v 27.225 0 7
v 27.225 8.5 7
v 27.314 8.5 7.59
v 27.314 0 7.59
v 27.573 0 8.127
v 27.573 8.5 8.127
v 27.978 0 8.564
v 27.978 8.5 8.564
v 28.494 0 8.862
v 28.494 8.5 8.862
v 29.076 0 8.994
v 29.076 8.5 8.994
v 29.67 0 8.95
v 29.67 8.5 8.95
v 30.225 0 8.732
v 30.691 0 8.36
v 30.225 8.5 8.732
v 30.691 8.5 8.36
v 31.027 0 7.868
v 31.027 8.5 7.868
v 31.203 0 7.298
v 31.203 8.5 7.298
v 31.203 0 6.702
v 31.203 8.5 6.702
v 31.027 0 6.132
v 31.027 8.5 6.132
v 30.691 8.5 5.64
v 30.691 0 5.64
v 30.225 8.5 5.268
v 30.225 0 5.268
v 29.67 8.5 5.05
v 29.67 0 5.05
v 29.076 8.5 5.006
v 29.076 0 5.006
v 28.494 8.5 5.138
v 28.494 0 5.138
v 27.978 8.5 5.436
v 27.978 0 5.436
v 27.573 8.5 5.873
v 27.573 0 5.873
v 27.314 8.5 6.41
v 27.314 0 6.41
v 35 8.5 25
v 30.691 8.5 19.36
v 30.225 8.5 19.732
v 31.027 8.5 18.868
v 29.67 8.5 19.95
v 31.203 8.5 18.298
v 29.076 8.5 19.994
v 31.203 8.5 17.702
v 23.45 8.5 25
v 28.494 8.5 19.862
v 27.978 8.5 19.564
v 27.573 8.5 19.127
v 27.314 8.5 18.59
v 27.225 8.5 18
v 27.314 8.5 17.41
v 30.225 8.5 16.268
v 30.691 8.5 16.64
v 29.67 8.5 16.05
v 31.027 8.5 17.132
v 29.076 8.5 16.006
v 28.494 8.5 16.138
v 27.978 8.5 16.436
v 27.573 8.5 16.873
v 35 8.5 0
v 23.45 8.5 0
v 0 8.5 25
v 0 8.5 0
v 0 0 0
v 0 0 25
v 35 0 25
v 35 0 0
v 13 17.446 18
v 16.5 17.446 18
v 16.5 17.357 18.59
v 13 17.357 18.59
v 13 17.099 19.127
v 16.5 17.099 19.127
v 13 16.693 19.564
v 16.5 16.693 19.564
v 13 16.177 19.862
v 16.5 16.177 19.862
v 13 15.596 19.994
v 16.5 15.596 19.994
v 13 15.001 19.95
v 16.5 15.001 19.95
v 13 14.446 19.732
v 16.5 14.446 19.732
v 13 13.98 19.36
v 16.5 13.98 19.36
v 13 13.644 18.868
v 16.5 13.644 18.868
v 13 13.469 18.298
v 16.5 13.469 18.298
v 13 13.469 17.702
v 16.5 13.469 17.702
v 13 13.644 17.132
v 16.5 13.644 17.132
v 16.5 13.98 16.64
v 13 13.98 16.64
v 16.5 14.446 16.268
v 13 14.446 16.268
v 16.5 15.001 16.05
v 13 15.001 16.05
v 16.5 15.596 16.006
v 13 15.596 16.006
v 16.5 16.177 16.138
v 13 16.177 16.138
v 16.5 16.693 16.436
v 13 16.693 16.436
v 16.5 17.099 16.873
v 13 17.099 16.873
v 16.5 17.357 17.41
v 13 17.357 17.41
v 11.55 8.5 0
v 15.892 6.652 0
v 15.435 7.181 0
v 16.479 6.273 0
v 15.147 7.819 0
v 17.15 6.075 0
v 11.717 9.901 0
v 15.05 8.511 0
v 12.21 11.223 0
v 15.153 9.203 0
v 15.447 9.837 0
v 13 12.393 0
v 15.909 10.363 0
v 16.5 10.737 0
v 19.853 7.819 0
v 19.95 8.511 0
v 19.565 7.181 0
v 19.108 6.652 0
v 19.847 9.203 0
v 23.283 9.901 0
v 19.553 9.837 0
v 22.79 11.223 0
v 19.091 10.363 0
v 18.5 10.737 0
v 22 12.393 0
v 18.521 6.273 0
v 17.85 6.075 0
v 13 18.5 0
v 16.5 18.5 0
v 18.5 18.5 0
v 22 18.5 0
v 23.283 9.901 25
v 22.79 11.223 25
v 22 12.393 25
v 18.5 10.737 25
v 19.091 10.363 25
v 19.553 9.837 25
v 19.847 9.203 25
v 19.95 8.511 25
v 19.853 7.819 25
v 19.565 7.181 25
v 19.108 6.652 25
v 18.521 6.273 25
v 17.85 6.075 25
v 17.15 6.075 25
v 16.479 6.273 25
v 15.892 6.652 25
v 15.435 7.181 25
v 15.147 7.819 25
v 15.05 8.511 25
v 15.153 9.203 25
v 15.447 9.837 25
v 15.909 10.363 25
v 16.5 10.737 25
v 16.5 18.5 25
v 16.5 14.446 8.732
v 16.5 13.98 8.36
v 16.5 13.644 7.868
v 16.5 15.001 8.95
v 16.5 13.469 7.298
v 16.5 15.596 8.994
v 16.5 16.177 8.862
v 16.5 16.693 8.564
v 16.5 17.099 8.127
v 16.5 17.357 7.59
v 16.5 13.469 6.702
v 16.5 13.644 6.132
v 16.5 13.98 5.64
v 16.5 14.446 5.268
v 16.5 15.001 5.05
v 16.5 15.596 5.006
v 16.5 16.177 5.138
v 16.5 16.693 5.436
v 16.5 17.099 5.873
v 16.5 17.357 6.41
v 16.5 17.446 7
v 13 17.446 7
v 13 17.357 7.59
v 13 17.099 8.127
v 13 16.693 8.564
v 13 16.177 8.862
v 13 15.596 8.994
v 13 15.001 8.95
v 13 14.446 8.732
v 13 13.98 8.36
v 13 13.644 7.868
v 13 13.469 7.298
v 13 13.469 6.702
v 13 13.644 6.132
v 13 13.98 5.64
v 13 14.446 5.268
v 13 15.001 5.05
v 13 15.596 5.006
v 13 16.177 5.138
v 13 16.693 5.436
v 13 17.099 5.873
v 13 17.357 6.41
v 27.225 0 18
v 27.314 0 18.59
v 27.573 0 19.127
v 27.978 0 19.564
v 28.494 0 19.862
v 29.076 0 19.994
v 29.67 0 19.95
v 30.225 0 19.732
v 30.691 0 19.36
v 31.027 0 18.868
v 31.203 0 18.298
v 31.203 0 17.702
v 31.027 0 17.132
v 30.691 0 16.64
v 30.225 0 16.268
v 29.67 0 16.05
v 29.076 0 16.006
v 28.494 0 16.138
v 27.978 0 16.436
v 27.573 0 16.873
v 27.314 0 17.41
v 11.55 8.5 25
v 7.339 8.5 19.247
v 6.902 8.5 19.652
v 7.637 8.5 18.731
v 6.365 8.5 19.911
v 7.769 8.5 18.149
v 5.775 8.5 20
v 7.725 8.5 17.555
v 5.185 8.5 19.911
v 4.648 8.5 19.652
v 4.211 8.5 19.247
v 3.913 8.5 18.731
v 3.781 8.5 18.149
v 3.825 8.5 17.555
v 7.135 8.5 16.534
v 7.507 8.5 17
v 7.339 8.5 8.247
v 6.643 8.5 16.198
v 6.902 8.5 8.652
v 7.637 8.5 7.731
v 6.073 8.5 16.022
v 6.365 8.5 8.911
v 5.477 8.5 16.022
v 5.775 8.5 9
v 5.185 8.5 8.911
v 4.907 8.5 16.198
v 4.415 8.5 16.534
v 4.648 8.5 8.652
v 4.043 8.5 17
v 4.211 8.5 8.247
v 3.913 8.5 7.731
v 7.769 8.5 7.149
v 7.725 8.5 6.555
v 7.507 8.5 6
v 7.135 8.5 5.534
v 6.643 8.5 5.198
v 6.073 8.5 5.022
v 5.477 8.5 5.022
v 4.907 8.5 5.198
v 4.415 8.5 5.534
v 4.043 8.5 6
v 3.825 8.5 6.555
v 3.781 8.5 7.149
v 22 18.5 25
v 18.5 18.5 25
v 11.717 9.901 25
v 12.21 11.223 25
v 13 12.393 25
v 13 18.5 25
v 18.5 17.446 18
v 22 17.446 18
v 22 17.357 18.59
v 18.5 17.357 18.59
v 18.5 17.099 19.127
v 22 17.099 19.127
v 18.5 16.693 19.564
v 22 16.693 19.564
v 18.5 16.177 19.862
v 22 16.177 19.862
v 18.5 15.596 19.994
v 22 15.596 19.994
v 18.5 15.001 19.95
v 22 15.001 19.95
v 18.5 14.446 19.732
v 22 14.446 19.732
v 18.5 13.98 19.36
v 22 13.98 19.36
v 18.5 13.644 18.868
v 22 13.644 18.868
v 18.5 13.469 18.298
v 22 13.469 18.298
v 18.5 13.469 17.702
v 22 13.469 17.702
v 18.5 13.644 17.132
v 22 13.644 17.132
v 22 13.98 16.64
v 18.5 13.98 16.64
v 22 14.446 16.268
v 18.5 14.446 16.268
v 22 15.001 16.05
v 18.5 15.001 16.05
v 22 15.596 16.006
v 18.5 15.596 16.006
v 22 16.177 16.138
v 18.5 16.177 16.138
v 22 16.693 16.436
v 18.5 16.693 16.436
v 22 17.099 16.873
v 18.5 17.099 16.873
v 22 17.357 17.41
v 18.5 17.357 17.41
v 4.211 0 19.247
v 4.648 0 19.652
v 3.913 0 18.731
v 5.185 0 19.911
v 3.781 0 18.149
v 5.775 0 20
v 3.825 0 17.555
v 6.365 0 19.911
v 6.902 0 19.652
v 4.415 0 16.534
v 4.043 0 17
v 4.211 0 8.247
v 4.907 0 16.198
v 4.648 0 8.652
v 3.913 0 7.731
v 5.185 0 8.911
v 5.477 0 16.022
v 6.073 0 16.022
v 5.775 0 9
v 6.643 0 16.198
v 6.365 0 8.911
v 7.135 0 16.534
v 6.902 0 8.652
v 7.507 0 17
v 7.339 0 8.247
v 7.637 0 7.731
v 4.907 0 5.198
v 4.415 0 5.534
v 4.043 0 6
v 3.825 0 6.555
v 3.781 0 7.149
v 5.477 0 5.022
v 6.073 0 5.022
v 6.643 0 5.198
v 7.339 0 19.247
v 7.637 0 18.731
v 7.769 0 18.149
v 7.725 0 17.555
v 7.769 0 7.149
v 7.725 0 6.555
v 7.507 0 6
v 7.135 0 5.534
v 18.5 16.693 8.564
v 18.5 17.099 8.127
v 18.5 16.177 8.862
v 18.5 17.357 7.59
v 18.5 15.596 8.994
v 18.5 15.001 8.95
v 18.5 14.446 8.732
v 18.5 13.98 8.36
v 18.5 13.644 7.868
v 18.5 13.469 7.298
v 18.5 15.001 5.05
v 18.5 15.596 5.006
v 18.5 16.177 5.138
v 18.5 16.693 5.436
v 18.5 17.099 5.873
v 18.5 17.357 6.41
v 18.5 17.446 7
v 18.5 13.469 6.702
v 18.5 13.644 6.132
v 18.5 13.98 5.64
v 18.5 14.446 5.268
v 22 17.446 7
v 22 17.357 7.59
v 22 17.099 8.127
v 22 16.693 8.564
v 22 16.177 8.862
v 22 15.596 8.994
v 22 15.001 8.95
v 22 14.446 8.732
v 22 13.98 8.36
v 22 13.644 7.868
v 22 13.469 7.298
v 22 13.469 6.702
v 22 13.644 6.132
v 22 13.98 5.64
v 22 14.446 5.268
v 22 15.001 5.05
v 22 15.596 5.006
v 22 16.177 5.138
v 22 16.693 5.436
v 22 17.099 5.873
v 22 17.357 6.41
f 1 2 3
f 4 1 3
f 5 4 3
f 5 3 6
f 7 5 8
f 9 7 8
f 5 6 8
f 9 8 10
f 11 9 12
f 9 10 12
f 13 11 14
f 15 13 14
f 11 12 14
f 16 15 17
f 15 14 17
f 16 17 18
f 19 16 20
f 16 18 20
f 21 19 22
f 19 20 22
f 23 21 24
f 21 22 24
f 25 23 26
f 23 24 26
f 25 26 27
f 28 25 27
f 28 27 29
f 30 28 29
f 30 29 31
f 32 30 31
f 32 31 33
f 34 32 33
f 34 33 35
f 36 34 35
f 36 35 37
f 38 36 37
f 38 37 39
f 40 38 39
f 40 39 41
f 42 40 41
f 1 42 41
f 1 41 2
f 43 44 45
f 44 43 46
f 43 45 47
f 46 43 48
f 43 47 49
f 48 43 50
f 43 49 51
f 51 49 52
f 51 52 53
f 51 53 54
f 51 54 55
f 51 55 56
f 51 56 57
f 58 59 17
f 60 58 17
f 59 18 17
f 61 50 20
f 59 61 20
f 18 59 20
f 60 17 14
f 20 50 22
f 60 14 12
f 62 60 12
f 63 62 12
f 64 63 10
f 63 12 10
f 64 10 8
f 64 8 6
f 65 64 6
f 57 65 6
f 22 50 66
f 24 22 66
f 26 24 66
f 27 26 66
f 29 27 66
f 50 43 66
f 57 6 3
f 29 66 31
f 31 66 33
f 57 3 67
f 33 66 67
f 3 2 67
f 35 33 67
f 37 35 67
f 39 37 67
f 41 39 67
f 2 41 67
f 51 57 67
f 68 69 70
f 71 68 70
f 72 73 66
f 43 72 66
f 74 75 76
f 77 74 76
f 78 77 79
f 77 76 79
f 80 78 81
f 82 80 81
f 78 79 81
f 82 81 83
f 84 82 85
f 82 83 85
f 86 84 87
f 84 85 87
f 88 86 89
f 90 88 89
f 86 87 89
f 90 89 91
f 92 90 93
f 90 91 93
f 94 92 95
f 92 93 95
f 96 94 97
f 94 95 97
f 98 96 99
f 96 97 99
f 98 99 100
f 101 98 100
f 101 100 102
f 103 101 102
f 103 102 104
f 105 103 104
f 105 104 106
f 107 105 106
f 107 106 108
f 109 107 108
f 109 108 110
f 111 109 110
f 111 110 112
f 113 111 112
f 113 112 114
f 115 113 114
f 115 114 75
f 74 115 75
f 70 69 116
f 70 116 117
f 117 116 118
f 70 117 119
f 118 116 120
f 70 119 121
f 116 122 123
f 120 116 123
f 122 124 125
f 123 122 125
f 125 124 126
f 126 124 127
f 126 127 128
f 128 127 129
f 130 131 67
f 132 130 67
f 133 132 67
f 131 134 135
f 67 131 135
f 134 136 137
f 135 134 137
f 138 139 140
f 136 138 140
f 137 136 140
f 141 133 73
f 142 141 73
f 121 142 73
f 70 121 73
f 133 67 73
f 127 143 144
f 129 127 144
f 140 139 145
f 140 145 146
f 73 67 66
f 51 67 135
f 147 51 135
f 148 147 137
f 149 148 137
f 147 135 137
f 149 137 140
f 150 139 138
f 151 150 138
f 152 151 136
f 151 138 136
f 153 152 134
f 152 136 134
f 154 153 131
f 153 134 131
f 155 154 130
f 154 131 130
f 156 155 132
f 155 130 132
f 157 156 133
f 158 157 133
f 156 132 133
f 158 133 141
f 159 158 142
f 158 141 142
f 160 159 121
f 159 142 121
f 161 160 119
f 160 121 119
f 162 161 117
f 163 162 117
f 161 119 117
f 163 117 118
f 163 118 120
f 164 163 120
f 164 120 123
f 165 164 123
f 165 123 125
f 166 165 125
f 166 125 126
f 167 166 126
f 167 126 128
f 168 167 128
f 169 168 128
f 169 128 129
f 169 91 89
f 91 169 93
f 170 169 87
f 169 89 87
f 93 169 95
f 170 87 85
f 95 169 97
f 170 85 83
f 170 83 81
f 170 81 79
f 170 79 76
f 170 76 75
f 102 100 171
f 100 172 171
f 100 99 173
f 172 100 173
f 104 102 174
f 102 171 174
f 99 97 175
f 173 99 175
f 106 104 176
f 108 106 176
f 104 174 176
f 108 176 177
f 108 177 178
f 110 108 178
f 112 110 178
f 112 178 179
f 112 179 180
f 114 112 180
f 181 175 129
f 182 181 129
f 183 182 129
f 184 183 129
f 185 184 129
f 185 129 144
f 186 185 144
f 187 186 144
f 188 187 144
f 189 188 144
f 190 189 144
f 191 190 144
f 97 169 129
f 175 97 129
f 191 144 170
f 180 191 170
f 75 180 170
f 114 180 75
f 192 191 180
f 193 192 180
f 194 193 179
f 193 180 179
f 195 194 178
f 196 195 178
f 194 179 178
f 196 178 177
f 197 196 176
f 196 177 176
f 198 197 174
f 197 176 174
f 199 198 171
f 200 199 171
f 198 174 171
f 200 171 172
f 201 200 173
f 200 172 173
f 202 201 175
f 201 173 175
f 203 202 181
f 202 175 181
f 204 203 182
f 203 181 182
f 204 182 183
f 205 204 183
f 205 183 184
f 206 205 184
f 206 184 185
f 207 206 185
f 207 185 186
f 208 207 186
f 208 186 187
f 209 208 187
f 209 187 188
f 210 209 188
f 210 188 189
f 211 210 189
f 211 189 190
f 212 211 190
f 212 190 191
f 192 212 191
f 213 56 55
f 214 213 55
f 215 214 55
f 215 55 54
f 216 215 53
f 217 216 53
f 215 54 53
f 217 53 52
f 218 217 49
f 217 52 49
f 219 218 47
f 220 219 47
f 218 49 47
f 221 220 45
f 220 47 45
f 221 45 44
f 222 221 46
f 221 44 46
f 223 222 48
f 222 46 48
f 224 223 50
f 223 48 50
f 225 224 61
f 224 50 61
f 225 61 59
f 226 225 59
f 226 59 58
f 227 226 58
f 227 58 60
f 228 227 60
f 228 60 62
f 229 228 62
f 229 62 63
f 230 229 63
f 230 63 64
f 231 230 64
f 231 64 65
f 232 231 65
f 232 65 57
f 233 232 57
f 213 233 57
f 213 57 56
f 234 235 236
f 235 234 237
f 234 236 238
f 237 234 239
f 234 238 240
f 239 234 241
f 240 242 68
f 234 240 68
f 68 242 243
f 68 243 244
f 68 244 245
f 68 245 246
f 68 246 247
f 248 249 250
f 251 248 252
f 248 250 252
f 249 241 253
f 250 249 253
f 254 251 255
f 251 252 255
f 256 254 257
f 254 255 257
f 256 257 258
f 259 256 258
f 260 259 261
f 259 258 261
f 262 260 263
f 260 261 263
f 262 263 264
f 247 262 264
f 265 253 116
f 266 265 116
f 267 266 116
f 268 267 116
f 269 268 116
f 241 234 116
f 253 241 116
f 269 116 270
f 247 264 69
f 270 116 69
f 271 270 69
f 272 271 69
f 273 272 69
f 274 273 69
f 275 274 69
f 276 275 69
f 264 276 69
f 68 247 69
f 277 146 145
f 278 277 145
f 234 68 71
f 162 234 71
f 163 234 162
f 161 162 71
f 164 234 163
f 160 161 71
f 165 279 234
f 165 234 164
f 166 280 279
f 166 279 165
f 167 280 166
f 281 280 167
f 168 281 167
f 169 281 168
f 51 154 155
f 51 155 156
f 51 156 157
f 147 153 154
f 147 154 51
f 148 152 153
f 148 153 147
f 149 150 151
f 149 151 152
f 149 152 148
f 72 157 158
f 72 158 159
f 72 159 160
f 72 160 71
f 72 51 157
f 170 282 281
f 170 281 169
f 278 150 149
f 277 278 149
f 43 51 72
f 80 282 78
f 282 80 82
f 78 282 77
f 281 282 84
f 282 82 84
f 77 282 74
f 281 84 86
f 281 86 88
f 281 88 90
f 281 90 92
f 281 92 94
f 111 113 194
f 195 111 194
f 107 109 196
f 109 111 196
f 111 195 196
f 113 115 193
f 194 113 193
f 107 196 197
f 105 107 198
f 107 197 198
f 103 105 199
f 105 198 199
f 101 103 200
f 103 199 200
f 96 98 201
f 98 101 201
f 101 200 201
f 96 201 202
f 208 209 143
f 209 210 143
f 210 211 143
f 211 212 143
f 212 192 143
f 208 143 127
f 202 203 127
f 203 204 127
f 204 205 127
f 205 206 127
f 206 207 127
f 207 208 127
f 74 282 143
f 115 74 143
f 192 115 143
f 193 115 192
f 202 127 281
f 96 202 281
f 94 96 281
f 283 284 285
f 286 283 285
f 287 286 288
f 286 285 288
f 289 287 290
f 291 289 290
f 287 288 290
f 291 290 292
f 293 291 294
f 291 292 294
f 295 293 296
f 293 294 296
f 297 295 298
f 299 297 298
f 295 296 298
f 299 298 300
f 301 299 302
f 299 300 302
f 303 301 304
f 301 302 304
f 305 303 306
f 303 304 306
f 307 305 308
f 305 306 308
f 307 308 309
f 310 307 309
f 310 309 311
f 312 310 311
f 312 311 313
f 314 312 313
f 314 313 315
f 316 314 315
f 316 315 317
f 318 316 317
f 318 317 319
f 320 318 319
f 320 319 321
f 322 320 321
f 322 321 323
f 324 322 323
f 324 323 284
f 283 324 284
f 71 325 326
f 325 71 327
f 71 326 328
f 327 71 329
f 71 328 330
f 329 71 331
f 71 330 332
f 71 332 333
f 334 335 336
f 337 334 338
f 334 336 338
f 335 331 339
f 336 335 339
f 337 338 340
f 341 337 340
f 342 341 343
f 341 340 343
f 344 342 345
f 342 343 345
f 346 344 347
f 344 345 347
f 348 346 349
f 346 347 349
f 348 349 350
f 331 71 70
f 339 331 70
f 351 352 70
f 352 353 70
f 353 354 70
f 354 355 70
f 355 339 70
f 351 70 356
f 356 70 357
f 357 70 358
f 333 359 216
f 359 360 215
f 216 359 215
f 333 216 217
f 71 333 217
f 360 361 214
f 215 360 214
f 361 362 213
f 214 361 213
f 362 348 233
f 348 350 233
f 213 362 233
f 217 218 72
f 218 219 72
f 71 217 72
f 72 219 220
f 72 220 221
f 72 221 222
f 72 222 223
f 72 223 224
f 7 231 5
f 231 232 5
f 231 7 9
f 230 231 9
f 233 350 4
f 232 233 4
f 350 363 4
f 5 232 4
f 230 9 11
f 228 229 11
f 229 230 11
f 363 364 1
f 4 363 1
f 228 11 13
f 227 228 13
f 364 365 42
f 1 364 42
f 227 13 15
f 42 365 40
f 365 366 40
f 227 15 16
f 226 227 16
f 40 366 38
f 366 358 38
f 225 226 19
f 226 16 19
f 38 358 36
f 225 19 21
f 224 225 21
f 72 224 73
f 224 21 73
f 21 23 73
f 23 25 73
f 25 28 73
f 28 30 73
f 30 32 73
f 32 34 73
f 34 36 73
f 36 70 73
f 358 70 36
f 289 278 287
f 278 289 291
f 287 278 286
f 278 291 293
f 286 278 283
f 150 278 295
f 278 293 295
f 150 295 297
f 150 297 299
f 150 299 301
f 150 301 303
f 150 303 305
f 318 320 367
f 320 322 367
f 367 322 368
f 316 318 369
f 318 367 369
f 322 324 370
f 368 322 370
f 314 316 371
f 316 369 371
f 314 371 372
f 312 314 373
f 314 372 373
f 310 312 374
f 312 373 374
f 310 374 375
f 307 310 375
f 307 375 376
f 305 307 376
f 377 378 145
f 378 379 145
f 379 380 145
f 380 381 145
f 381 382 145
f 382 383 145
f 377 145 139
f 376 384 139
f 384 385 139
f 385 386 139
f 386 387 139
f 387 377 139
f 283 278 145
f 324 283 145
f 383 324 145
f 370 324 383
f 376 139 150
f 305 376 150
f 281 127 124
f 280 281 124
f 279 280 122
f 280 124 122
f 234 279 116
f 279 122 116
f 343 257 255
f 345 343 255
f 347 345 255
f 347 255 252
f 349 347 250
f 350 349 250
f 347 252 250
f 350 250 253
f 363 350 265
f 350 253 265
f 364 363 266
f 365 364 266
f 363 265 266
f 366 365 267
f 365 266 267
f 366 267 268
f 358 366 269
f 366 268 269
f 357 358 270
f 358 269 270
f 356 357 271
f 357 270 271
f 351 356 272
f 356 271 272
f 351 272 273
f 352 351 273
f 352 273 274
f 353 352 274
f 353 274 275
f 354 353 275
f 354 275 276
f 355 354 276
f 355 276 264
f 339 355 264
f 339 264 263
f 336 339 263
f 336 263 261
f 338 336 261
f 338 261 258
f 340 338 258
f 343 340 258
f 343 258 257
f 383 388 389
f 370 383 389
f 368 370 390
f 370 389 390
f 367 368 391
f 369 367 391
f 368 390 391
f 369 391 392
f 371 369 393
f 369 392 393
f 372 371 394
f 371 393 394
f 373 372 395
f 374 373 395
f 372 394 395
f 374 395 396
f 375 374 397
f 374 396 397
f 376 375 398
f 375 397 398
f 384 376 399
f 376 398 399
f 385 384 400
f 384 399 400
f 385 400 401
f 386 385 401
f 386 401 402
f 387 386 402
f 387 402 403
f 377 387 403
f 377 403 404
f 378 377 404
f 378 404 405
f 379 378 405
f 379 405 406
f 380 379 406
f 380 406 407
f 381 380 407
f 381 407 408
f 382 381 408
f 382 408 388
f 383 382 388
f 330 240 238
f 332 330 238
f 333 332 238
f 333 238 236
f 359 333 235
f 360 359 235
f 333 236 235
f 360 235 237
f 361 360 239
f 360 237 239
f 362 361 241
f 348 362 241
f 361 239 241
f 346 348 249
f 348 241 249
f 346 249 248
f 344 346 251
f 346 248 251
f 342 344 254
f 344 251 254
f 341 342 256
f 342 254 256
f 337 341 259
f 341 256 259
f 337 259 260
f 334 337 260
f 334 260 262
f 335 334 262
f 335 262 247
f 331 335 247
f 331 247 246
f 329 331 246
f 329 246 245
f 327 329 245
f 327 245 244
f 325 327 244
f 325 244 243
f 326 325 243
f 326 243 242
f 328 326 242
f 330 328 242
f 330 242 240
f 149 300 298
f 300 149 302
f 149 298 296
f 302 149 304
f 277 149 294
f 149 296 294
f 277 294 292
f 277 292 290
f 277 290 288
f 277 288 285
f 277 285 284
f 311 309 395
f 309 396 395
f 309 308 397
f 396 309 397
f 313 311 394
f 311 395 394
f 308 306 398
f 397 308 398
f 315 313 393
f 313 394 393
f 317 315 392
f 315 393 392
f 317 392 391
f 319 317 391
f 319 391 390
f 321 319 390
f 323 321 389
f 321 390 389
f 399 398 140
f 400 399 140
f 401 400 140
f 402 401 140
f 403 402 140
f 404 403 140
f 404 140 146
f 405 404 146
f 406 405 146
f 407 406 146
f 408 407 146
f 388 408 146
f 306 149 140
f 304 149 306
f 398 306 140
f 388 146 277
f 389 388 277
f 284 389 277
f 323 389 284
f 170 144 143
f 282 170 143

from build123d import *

# Parameters (mm, degrees)
BOSS_EXTRUDE1_DEPTH = 25
CUT_EXTRUDE1_REACH  = 40.095
SKETCH2_R           = 2
CUT_EXTRUDE2_REACH  = 46.159
SKETCH3_R           = 2


with BuildPart() as part:
    # Sketch1 → Boss-Extrude1 (new body)
    with BuildSketch(Plane.XY):
        with BuildLine():
            Line((0, 0), (35, 0))
            Line((35, 0), (35, 8.5))
            Line((35, 8.5), (23.45, 8.5))
            ThreePointArc((23.45, 8.5), (23.075728652, 10.576956909), (22, 12.392621225))
            Line((22, 12.392621225), (22, 18.5))
            Line((22, 18.5), (18.5, 18.5))
            Line((18.5, 18.5), (18.5, 10.736626925))
            ThreePointArc((18.5, 10.736626925), (17.5, 6.05), (16.5, 10.736626925))
            Line((16.5, 10.736626925), (16.5, 18.5))
            Line((16.5, 18.5), (13, 18.5))
            Line((13, 18.5), (13, 12.392621225))
            ThreePointArc((13, 12.392621225), (11.924271348, 10.576956909), (11.55, 8.5))
            Line((11.55, 8.5), (0, 8.5))
            Line((0, 8.5), (0, 0))
        make_face()
    extrude(amount=BOSS_EXTRUDE1_DEPTH)

    # Cut-Extrude1: up to this face of the body (flat: up to its plane)
    cut_extrude1_end = Plane(part.part.faces().sort_by_distance((13, 15.446310612, 12.5))[0])
    # Sketch2 → Cut-Extrude1 (cut, up to the picked face)
    with BuildSketch(Plane(origin=(22, 0, 0), x_dir=(0, 0, -1), z_dir=(1, 0, 0)), mode=Mode.PRIVATE) as cut_extrude1_sk1:
        with Locations(Location((-18, 15.446310612, 0), (0, 0, 90))):
            Circle(SKETCH2_R)
    cut_extrude1_tool1 = split(extrude(cut_extrude1_sk1.sketch, amount=-CUT_EXTRUDE1_REACH, mode=Mode.PRIVATE), bisect_by=cut_extrude1_end, keep=Keep.BOTH, mode=Mode.PRIVATE)
    # Sketch2 → Cut-Extrude1 (cut, up to the picked face)
    with BuildSketch(Plane(origin=(22, 0, 0), x_dir=(0, 0, -1), z_dir=(1, 0, 0)), mode=Mode.PRIVATE) as cut_extrude1_sk2:
        with Locations(Location((-7, 15.446310612, 0), (0, 0, 90))):
            Circle(SKETCH2_R)
    cut_extrude1_tool2 = split(extrude(cut_extrude1_sk2.sketch, amount=-CUT_EXTRUDE1_REACH, mode=Mode.PRIVATE), bisect_by=cut_extrude1_end, keep=Keep.BOTH, mode=Mode.PRIVATE)
    add(cut_extrude1_tool1.solids().sort_by(Axis((22, 15.446311, 18), (-1, 0, 0)))[0], mode=Mode.SUBTRACT)
    add(cut_extrude1_tool2.solids().sort_by(Axis((22, 15.446311, 7), (-1, 0, 0)))[0], mode=Mode.SUBTRACT)

    # Sketch3 → Cut-Extrude2 (cut, up to next)
    with BuildSketch(Plane(origin=(0, 8.5, 0), x_dir=(1, 0, 0), z_dir=(0, 1, 0)), mode=Mode.PRIVATE) as cut_extrude2_sk1:
        with Locations(Location((29.225, -18, 0), (0, 0, 180))):
            Circle(SKETCH3_R)
    cut_extrude2_tool1 = extrude(cut_extrude2_sk1.sketch, amount=-CUT_EXTRUDE2_REACH, mode=Mode.PRIVATE) & part.part
    # Sketch3 → Cut-Extrude2 (cut, up to next)
    with BuildSketch(Plane(origin=(0, 8.5, 0), x_dir=(1, 0, 0), z_dir=(0, 1, 0)), mode=Mode.PRIVATE) as cut_extrude2_sk2:
        with Locations(Location((29.225, -7, 0), (0, 0, 180))):
            Circle(SKETCH3_R)
    cut_extrude2_tool2 = extrude(cut_extrude2_sk2.sketch, amount=-CUT_EXTRUDE2_REACH, mode=Mode.PRIVATE) & part.part
    # Sketch3 → Cut-Extrude2 (cut, up to next)
    with BuildSketch(Plane(origin=(0, 8.5, 0), x_dir=(1, 0, 0), z_dir=(0, 1, 0)), mode=Mode.PRIVATE) as cut_extrude2_sk3:
        with Locations(Location((5.775, -7, 0), (0, 0, 270))):
            Circle(SKETCH3_R)
    cut_extrude2_tool3 = extrude(cut_extrude2_sk3.sketch, amount=-CUT_EXTRUDE2_REACH, mode=Mode.PRIVATE) & part.part
    # Sketch3 → Cut-Extrude2 (cut, up to next)
    with BuildSketch(Plane(origin=(0, 8.5, 0), x_dir=(1, 0, 0), z_dir=(0, 1, 0)), mode=Mode.PRIVATE) as cut_extrude2_sk4:
        with Locations(Location((5.775, -18, 0), (0, 0, 270))):
            Circle(SKETCH3_R)
    cut_extrude2_tool4 = extrude(cut_extrude2_sk4.sketch, amount=-CUT_EXTRUDE2_REACH, mode=Mode.PRIVATE) & part.part
    add(cut_extrude2_tool1.solids().sort_by_distance((29.225, 8.5, 18))[0], mode=Mode.SUBTRACT)
    add(cut_extrude2_tool2.solids().sort_by_distance((29.225, 8.5, 7))[0], mode=Mode.SUBTRACT)
    add(cut_extrude2_tool3.solids().sort_by_distance((5.775, 8.5, 7))[0], mode=Mode.SUBTRACT)
    add(cut_extrude2_tool4.solids().sort_by_distance((5.775, 8.5, 18))[0], mode=Mode.SUBTRACT)


solid = part.part
